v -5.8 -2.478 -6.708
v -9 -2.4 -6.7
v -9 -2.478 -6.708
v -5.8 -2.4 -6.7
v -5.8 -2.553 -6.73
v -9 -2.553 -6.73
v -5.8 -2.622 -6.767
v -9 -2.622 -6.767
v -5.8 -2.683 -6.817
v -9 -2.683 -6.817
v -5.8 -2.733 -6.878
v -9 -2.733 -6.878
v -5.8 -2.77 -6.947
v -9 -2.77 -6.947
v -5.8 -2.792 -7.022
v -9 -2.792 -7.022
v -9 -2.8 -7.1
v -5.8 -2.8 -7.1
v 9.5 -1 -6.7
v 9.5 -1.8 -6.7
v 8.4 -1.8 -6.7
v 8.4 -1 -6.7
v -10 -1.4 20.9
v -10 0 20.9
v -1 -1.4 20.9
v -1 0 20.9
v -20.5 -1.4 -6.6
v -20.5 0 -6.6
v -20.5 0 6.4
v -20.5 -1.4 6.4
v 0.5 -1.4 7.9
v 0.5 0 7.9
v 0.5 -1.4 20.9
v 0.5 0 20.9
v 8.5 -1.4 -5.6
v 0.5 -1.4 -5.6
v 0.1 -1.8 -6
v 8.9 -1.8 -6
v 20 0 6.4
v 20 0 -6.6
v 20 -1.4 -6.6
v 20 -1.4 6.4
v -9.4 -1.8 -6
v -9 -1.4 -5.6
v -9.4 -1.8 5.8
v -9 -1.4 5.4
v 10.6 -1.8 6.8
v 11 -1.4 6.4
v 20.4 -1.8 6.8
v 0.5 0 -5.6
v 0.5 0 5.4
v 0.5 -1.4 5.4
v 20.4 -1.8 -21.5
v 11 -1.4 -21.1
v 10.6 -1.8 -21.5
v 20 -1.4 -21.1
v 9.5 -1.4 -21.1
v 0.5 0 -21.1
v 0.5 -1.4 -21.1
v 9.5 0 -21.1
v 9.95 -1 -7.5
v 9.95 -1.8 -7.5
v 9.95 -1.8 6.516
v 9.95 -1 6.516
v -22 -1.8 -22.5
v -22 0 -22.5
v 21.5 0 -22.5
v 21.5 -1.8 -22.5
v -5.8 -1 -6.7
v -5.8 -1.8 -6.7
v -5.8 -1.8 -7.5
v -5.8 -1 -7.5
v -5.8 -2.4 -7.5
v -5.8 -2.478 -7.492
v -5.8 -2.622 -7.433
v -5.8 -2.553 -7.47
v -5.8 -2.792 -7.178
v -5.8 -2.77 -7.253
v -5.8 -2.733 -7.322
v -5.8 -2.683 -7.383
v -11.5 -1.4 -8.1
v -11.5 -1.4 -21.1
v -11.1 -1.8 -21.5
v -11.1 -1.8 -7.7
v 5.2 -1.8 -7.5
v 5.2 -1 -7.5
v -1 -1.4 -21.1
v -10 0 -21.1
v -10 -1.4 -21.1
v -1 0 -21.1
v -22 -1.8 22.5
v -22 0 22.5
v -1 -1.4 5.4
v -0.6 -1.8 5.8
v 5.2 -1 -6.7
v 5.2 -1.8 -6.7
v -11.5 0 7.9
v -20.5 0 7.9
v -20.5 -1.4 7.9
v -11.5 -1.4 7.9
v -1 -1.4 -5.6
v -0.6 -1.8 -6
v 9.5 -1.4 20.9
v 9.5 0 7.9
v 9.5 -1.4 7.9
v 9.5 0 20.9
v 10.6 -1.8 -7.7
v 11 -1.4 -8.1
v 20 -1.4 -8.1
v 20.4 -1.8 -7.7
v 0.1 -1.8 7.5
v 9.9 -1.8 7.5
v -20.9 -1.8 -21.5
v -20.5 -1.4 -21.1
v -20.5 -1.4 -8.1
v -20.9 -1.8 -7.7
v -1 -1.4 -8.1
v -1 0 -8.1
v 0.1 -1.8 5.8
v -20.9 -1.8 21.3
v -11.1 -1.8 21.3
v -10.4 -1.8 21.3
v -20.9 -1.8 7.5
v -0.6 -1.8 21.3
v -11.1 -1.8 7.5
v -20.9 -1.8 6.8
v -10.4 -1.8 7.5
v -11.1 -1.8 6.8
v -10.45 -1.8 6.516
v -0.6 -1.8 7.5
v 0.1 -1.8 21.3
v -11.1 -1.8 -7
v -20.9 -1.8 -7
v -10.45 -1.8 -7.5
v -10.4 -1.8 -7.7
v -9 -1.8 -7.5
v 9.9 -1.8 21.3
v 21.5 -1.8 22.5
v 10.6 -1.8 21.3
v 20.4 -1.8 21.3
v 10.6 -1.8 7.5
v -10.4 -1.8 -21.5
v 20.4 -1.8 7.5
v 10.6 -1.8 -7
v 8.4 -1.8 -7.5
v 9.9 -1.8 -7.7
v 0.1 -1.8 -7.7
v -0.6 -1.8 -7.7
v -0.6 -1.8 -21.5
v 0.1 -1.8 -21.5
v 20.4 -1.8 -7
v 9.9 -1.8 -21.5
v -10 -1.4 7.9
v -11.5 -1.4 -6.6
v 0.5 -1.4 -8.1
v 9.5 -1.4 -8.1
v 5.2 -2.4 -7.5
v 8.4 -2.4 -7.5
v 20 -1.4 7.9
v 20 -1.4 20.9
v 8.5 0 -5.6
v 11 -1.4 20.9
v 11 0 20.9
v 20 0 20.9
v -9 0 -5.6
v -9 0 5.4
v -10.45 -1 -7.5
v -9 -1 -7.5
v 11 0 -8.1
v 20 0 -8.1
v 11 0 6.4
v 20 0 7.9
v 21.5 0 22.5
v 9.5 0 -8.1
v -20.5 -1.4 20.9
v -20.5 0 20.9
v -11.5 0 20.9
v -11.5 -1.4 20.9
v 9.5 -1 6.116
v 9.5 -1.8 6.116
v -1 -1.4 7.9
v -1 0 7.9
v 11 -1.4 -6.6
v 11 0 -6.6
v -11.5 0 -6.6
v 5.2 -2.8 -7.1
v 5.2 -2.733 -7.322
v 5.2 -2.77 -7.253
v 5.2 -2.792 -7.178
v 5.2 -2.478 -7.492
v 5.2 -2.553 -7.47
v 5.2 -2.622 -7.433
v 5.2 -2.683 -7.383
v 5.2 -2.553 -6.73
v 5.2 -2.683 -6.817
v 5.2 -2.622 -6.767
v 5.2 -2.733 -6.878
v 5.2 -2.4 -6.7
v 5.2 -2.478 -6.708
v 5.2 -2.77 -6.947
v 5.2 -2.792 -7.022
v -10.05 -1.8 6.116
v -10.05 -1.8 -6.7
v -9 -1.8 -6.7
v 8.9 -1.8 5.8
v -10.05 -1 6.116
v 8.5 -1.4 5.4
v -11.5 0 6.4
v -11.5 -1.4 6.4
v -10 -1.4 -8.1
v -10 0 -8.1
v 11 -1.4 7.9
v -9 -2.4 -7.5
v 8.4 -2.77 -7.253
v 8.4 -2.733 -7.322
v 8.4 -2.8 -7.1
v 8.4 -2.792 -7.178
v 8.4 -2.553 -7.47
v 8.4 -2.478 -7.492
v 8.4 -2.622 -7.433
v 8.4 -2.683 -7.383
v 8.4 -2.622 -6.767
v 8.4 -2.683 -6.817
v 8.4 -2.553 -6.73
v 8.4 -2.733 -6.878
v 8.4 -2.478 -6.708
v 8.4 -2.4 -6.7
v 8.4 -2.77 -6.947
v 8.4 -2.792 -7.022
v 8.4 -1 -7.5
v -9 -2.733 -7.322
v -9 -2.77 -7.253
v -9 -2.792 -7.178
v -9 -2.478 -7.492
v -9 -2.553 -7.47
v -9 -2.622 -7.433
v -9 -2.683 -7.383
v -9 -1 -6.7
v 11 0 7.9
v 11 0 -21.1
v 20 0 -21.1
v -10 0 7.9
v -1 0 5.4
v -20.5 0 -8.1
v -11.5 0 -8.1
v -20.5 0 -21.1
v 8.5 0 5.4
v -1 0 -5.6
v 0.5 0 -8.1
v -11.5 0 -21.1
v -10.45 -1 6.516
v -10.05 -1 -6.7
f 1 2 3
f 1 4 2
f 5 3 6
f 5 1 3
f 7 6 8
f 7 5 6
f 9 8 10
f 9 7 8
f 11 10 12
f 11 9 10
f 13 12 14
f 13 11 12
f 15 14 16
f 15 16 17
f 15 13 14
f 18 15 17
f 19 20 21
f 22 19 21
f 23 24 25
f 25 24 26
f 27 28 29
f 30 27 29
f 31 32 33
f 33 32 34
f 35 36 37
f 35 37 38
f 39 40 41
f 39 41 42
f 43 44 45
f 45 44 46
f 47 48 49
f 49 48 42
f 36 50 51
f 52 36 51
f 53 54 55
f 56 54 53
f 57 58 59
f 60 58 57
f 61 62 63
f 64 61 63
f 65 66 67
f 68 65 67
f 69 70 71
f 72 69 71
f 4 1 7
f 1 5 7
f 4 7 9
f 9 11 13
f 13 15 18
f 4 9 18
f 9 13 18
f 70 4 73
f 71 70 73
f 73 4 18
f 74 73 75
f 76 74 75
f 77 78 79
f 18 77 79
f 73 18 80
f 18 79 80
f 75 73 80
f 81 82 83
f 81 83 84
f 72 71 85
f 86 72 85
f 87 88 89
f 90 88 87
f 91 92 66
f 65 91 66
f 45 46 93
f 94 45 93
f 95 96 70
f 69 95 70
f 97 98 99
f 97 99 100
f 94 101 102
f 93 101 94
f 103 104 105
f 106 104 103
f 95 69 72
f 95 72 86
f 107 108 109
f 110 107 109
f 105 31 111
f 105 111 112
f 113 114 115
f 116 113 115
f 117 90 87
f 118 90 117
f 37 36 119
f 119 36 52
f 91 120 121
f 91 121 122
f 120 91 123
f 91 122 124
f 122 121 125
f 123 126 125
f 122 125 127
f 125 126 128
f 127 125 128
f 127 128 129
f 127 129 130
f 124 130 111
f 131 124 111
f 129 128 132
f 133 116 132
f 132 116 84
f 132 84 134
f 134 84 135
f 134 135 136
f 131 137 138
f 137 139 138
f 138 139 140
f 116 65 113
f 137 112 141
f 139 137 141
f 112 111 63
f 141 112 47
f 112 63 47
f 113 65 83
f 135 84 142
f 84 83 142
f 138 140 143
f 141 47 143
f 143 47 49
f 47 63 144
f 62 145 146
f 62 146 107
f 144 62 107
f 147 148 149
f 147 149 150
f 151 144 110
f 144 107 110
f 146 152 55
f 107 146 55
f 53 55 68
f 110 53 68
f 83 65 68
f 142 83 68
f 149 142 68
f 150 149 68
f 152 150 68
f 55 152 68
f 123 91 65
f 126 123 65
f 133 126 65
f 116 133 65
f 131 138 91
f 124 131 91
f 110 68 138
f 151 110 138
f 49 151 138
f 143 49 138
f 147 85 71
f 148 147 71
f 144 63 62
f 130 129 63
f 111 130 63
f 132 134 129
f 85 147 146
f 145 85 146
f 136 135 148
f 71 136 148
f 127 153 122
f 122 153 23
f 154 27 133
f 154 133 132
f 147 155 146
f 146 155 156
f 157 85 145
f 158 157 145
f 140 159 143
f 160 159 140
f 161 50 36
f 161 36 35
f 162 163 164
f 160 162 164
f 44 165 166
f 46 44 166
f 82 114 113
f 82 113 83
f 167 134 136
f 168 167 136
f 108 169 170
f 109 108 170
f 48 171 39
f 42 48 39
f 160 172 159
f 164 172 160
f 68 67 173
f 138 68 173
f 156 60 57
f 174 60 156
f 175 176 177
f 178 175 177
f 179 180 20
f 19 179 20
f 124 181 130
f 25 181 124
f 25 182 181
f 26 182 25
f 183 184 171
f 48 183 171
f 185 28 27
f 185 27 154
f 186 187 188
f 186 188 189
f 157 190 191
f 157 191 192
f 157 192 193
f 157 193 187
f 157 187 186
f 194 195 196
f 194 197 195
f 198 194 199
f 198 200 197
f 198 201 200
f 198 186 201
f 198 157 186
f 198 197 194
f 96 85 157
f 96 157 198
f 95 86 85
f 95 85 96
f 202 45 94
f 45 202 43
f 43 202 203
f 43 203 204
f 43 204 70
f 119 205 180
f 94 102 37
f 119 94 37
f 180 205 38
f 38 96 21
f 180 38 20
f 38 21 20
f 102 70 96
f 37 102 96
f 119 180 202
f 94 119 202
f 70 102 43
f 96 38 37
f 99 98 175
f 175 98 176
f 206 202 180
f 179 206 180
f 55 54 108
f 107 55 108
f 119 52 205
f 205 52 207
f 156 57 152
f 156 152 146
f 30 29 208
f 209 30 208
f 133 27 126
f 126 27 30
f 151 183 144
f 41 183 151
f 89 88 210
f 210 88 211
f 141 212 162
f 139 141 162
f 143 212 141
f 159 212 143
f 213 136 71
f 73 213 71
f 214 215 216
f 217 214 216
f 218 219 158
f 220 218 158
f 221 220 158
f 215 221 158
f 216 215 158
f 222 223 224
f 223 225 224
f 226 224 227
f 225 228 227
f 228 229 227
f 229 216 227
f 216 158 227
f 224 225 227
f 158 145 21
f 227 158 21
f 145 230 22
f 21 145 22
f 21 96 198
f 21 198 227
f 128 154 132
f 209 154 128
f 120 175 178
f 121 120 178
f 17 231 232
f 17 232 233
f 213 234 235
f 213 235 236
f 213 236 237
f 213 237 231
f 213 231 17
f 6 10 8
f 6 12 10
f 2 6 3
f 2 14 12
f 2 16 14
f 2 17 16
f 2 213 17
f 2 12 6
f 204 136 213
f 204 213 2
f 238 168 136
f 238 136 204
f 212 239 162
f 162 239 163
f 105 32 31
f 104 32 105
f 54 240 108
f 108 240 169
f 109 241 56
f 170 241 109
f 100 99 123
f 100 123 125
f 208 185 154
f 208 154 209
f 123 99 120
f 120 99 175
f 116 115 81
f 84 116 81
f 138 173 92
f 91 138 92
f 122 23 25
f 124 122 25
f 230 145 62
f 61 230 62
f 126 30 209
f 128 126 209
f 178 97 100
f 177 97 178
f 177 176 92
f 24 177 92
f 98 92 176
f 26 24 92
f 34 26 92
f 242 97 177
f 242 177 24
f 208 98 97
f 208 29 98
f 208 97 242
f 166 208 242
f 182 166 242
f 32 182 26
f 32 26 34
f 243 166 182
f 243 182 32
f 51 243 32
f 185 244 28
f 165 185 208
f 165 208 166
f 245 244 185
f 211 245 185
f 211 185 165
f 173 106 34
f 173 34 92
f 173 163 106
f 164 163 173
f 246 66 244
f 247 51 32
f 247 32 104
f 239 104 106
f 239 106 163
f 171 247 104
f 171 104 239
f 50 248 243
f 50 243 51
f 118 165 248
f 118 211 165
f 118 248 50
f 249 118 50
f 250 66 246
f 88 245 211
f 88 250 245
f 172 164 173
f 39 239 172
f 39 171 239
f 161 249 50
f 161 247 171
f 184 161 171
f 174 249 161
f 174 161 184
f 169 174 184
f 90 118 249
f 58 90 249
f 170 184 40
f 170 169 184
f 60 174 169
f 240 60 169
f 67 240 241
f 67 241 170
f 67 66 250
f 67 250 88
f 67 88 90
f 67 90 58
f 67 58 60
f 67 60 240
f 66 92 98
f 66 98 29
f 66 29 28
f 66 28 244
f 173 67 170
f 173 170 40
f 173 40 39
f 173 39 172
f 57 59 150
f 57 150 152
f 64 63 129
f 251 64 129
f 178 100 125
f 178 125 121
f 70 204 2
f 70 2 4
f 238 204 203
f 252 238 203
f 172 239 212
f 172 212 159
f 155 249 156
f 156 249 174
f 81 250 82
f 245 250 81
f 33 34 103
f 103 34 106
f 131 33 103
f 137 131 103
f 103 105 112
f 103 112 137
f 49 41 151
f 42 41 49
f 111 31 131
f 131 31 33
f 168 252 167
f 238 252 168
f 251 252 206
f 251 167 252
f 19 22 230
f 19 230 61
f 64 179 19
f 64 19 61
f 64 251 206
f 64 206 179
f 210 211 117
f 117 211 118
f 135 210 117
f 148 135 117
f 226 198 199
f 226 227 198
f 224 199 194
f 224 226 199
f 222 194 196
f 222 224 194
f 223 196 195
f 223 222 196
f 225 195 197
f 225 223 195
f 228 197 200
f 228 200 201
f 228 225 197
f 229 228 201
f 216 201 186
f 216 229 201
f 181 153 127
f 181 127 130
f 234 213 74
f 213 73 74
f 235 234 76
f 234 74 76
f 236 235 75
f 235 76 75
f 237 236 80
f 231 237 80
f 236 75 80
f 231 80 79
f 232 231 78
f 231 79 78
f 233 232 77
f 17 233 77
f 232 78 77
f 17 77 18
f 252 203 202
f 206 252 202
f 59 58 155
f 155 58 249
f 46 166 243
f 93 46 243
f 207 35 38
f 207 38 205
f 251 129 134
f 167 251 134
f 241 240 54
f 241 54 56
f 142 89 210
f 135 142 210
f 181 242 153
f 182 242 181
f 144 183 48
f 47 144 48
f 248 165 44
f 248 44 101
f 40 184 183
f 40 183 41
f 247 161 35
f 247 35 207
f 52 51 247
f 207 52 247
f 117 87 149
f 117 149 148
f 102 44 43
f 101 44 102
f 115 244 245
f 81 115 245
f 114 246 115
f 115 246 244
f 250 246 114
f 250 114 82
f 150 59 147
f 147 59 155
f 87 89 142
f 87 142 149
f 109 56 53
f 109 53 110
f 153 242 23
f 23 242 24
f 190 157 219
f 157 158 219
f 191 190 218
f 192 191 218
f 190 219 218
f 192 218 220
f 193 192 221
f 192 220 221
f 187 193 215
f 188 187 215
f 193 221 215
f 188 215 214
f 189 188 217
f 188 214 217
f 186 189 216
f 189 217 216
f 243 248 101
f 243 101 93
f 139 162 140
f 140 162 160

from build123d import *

# Parameters (mm, degrees)
F0_W     = 9
F0_H     = 13
F1_DEPTH = 1.8
F2_DEPTH = 1
F3_DEPTH = 1
F4_DEPTH = 1
F5_DEPTH = 1
F7_DEPTH = 0.8
F8_W     = 3.2
F8_H     = 0.8
F9_DEPTH = 1
F10_R    = 0.39999
F11_SIZE = 0.4


# Not quite as in the source:
# - a fillet or chamfer is up to 0.001 mm smaller than in the source, because OpenCascade refuses the exact size
# - a feature names something its author has since deleted; it is built from what else it names


with BuildPart() as f1:
    # F0 (on Front) → F1 (new body)
    with BuildSketch(Plane.XZ):
        Polygon((-22, -22.5), (21.5, -22.5), (21.5, 22.5), (-22, 22.5), (-22, -7.5), align=None)
        with Locations((-16, -14.6)):
            Rectangle(F0_W, F0_H, mode=Mode.SUBTRACT)
        with Locations((-5.5, -14.6)):
            Rectangle(F0_W, F0_H, mode=Mode.SUBTRACT)
        with Locations((-16, -0.1)):
            Rectangle(F0_W, F0_H, mode=Mode.SUBTRACT)
        with Locations((-5.5, -0.1)):
            Rectangle(F0_W, F0_H, mode=Mode.SUBTRACT)
        with Locations((5, -14.6)):
            Rectangle(F0_W, F0_H, mode=Mode.SUBTRACT)
        with Locations((15.5, -14.6)):
            Rectangle(F0_W, F0_H, mode=Mode.SUBTRACT)
        with Locations((5, -0.1)):
            Rectangle(F0_W, F0_H, mode=Mode.SUBTRACT)
        with Locations((15.5, -0.1)):
            Rectangle(F0_W, F0_H, mode=Mode.SUBTRACT)
        with Locations((-16, 14.4)):
            Rectangle(F0_W, F0_H, mode=Mode.SUBTRACT)
        with Locations((-5.5, 14.4)):
            Rectangle(F0_W, F0_H, mode=Mode.SUBTRACT)
        with Locations((5, 14.4)):
            Rectangle(F0_W, F0_H, mode=Mode.SUBTRACT)
        with Locations((15.5, 14.4)):
            Rectangle(F0_W, F0_H, mode=Mode.SUBTRACT)
    extrude(amount=F1_DEPTH)

    # F2 (add): a face of the model
    f2_faces = [f1.faces().sort_by_distance(p)[0] for p in [
        (9.5, -0.9, -0.1),
    ]]
    extrude(f2_faces, amount=F2_DEPTH)

    # F3 (add): a face of the model
    f3_faces = [f1.faces().sort_by_distance(p)[0] for p in [
        (-10, -0.9, -0.1),
    ]]
    extrude(f3_faces, amount=F3_DEPTH)

    # F4 (add): faces of the model
    f4_faces = [f1.faces().sort_by_distance(p)[0] for p in [
        (-5, -0.9, 6.4),
        (4.5, -0.9, 6.4),
    ]]
    extrude(f4_faces, amount=F4_DEPTH)

    # F5 (add): faces of the model
    f5_faces = [f1.faces().sort_by_distance(p)[0] for p in [
        (-5, -0.9, -6.6),
        (4.5, -0.9, -6.6),
    ]]
    extrude(f5_faces, amount=F5_DEPTH)

    # F6 (on face) → F7 (cut)
    with BuildSketch(Plane.XZ.offset(1.8)):
        Polygon((5.2, -7.5), (5.2, -6.7), (-5.8, -6.7), (-5.8, -7.5), (-0.25, -7.5), align=None)
        Polygon((-9, -6.7), (-10.05, -6.7), (-10.45, -6.7), (-10.45, -7.5), (-9, -7.5), align=None)
        Polygon((9.5, 6.1155543663), (9.5, -6.7), (8.4, -6.7), (8.4, -7.5), (9.95, -7.5), (9.95, 6.5155543663), (-10.45, 6.5155543663), (-10.45, -6.7), (-10.05, -6.7), (-10.05, 6.1155543663), align=None)
    extrude(amount=-F7_DEPTH, mode=Mode.SUBTRACT)

    # F8 (on face) → F9 (join)
    with BuildSketch(Plane.XZ.offset(1.8)):
        with Locations((6.8, -7.1)):
            Rectangle(F8_W, F8_H)
        with Locations((-7.4, -7.1)):
            Rectangle(F8_W, F8_H)
    extrude(amount=F9_DEPTH)

    # F10 (radius 0.4 in the source; OpenCascade refuses exactly that, so slightly less here)
    f10_edges = [f1.edges().sort_by_distance(p)[0] for p in [
        (6.8, -2.8, -6.7),
        (6.8, -2.8, -7.5),
        (-7.4, -2.8, -7.5),
        (-7.4, -2.8, -6.7),
    ]]
    fillet(f10_edges, radius=F10_R)

    # F11
    f11_edges = [f1.edges().sort_by_distance(p)[0] for p in [
        (-20.5, -1.8, 14.4),
        (-11.5, -1.8, 14.4),
        (-16, -1.8, 20.9),
        (-16, -1.8, 7.9),
        (-16, -1.8, 6.4),
        (-20.5, -1.8, -0.1),
        (-16, -1.8, -6.6),
        (-11.5, -1.8, -0.1),
        (-5.5, -1.8, 7.9),
        (-10, -1.8, 14.4),
        (-1, -1.8, 14.4),
        (0.5, -1.8, 14.4),
        (5, -1.8, 7.9),
        (9.5, -1.8, 14.4),
        (-5, -1.8, 5.4),
        (-9, -1.8, -0.1),
        (-1, -1.8, -0.1),
        (0.5, -1.8, -0.1),
        (4.5, -1.8, 5.4),
        (8.5, -1.8, -0.1),
        (4.5, -1.8, -5.6),
        (-5, -1.8, -5.6),
        (-5.5, -1.8, 20.9),
        (5, -1.8, 20.9),
        (15.5, -1.8, 20.9),
        (20, -1.8, 14.4),
        (15.5, -1.8, 7.9),
        (11, -1.8, 14.4),
        (15.5, -1.8, 6.4),
        (11, -1.8, -0.1),
        (20, -1.8, -0.1),
        (15.5, -1.8, -6.6),
        (15.5, -1.8, -8.1),
        (11, -1.8, -14.6),
        (15.5, -1.8, -21.1),
        (20, -1.8, -14.6),
        (9.5, -1.8, -14.6),
        (5, -1.8, -8.1),
        (0.5, -1.8, -14.6),
        (5, -1.8, -21.1),
        (-5.5, -1.8, -21.1),
        (-1, -1.8, -14.6),
        (-5.5, -1.8, -8.1),
        (-10, -1.8, -14.6),
        (-11.5, -1.8, -14.6),
        (-16, -1.8, -8.1),
        (-20.5, -1.8, -14.6),
        (-16, -1.8, -21.1),
    ]]
    chamfer(f11_edges, length=F11_SIZE)


solid = f1.part
